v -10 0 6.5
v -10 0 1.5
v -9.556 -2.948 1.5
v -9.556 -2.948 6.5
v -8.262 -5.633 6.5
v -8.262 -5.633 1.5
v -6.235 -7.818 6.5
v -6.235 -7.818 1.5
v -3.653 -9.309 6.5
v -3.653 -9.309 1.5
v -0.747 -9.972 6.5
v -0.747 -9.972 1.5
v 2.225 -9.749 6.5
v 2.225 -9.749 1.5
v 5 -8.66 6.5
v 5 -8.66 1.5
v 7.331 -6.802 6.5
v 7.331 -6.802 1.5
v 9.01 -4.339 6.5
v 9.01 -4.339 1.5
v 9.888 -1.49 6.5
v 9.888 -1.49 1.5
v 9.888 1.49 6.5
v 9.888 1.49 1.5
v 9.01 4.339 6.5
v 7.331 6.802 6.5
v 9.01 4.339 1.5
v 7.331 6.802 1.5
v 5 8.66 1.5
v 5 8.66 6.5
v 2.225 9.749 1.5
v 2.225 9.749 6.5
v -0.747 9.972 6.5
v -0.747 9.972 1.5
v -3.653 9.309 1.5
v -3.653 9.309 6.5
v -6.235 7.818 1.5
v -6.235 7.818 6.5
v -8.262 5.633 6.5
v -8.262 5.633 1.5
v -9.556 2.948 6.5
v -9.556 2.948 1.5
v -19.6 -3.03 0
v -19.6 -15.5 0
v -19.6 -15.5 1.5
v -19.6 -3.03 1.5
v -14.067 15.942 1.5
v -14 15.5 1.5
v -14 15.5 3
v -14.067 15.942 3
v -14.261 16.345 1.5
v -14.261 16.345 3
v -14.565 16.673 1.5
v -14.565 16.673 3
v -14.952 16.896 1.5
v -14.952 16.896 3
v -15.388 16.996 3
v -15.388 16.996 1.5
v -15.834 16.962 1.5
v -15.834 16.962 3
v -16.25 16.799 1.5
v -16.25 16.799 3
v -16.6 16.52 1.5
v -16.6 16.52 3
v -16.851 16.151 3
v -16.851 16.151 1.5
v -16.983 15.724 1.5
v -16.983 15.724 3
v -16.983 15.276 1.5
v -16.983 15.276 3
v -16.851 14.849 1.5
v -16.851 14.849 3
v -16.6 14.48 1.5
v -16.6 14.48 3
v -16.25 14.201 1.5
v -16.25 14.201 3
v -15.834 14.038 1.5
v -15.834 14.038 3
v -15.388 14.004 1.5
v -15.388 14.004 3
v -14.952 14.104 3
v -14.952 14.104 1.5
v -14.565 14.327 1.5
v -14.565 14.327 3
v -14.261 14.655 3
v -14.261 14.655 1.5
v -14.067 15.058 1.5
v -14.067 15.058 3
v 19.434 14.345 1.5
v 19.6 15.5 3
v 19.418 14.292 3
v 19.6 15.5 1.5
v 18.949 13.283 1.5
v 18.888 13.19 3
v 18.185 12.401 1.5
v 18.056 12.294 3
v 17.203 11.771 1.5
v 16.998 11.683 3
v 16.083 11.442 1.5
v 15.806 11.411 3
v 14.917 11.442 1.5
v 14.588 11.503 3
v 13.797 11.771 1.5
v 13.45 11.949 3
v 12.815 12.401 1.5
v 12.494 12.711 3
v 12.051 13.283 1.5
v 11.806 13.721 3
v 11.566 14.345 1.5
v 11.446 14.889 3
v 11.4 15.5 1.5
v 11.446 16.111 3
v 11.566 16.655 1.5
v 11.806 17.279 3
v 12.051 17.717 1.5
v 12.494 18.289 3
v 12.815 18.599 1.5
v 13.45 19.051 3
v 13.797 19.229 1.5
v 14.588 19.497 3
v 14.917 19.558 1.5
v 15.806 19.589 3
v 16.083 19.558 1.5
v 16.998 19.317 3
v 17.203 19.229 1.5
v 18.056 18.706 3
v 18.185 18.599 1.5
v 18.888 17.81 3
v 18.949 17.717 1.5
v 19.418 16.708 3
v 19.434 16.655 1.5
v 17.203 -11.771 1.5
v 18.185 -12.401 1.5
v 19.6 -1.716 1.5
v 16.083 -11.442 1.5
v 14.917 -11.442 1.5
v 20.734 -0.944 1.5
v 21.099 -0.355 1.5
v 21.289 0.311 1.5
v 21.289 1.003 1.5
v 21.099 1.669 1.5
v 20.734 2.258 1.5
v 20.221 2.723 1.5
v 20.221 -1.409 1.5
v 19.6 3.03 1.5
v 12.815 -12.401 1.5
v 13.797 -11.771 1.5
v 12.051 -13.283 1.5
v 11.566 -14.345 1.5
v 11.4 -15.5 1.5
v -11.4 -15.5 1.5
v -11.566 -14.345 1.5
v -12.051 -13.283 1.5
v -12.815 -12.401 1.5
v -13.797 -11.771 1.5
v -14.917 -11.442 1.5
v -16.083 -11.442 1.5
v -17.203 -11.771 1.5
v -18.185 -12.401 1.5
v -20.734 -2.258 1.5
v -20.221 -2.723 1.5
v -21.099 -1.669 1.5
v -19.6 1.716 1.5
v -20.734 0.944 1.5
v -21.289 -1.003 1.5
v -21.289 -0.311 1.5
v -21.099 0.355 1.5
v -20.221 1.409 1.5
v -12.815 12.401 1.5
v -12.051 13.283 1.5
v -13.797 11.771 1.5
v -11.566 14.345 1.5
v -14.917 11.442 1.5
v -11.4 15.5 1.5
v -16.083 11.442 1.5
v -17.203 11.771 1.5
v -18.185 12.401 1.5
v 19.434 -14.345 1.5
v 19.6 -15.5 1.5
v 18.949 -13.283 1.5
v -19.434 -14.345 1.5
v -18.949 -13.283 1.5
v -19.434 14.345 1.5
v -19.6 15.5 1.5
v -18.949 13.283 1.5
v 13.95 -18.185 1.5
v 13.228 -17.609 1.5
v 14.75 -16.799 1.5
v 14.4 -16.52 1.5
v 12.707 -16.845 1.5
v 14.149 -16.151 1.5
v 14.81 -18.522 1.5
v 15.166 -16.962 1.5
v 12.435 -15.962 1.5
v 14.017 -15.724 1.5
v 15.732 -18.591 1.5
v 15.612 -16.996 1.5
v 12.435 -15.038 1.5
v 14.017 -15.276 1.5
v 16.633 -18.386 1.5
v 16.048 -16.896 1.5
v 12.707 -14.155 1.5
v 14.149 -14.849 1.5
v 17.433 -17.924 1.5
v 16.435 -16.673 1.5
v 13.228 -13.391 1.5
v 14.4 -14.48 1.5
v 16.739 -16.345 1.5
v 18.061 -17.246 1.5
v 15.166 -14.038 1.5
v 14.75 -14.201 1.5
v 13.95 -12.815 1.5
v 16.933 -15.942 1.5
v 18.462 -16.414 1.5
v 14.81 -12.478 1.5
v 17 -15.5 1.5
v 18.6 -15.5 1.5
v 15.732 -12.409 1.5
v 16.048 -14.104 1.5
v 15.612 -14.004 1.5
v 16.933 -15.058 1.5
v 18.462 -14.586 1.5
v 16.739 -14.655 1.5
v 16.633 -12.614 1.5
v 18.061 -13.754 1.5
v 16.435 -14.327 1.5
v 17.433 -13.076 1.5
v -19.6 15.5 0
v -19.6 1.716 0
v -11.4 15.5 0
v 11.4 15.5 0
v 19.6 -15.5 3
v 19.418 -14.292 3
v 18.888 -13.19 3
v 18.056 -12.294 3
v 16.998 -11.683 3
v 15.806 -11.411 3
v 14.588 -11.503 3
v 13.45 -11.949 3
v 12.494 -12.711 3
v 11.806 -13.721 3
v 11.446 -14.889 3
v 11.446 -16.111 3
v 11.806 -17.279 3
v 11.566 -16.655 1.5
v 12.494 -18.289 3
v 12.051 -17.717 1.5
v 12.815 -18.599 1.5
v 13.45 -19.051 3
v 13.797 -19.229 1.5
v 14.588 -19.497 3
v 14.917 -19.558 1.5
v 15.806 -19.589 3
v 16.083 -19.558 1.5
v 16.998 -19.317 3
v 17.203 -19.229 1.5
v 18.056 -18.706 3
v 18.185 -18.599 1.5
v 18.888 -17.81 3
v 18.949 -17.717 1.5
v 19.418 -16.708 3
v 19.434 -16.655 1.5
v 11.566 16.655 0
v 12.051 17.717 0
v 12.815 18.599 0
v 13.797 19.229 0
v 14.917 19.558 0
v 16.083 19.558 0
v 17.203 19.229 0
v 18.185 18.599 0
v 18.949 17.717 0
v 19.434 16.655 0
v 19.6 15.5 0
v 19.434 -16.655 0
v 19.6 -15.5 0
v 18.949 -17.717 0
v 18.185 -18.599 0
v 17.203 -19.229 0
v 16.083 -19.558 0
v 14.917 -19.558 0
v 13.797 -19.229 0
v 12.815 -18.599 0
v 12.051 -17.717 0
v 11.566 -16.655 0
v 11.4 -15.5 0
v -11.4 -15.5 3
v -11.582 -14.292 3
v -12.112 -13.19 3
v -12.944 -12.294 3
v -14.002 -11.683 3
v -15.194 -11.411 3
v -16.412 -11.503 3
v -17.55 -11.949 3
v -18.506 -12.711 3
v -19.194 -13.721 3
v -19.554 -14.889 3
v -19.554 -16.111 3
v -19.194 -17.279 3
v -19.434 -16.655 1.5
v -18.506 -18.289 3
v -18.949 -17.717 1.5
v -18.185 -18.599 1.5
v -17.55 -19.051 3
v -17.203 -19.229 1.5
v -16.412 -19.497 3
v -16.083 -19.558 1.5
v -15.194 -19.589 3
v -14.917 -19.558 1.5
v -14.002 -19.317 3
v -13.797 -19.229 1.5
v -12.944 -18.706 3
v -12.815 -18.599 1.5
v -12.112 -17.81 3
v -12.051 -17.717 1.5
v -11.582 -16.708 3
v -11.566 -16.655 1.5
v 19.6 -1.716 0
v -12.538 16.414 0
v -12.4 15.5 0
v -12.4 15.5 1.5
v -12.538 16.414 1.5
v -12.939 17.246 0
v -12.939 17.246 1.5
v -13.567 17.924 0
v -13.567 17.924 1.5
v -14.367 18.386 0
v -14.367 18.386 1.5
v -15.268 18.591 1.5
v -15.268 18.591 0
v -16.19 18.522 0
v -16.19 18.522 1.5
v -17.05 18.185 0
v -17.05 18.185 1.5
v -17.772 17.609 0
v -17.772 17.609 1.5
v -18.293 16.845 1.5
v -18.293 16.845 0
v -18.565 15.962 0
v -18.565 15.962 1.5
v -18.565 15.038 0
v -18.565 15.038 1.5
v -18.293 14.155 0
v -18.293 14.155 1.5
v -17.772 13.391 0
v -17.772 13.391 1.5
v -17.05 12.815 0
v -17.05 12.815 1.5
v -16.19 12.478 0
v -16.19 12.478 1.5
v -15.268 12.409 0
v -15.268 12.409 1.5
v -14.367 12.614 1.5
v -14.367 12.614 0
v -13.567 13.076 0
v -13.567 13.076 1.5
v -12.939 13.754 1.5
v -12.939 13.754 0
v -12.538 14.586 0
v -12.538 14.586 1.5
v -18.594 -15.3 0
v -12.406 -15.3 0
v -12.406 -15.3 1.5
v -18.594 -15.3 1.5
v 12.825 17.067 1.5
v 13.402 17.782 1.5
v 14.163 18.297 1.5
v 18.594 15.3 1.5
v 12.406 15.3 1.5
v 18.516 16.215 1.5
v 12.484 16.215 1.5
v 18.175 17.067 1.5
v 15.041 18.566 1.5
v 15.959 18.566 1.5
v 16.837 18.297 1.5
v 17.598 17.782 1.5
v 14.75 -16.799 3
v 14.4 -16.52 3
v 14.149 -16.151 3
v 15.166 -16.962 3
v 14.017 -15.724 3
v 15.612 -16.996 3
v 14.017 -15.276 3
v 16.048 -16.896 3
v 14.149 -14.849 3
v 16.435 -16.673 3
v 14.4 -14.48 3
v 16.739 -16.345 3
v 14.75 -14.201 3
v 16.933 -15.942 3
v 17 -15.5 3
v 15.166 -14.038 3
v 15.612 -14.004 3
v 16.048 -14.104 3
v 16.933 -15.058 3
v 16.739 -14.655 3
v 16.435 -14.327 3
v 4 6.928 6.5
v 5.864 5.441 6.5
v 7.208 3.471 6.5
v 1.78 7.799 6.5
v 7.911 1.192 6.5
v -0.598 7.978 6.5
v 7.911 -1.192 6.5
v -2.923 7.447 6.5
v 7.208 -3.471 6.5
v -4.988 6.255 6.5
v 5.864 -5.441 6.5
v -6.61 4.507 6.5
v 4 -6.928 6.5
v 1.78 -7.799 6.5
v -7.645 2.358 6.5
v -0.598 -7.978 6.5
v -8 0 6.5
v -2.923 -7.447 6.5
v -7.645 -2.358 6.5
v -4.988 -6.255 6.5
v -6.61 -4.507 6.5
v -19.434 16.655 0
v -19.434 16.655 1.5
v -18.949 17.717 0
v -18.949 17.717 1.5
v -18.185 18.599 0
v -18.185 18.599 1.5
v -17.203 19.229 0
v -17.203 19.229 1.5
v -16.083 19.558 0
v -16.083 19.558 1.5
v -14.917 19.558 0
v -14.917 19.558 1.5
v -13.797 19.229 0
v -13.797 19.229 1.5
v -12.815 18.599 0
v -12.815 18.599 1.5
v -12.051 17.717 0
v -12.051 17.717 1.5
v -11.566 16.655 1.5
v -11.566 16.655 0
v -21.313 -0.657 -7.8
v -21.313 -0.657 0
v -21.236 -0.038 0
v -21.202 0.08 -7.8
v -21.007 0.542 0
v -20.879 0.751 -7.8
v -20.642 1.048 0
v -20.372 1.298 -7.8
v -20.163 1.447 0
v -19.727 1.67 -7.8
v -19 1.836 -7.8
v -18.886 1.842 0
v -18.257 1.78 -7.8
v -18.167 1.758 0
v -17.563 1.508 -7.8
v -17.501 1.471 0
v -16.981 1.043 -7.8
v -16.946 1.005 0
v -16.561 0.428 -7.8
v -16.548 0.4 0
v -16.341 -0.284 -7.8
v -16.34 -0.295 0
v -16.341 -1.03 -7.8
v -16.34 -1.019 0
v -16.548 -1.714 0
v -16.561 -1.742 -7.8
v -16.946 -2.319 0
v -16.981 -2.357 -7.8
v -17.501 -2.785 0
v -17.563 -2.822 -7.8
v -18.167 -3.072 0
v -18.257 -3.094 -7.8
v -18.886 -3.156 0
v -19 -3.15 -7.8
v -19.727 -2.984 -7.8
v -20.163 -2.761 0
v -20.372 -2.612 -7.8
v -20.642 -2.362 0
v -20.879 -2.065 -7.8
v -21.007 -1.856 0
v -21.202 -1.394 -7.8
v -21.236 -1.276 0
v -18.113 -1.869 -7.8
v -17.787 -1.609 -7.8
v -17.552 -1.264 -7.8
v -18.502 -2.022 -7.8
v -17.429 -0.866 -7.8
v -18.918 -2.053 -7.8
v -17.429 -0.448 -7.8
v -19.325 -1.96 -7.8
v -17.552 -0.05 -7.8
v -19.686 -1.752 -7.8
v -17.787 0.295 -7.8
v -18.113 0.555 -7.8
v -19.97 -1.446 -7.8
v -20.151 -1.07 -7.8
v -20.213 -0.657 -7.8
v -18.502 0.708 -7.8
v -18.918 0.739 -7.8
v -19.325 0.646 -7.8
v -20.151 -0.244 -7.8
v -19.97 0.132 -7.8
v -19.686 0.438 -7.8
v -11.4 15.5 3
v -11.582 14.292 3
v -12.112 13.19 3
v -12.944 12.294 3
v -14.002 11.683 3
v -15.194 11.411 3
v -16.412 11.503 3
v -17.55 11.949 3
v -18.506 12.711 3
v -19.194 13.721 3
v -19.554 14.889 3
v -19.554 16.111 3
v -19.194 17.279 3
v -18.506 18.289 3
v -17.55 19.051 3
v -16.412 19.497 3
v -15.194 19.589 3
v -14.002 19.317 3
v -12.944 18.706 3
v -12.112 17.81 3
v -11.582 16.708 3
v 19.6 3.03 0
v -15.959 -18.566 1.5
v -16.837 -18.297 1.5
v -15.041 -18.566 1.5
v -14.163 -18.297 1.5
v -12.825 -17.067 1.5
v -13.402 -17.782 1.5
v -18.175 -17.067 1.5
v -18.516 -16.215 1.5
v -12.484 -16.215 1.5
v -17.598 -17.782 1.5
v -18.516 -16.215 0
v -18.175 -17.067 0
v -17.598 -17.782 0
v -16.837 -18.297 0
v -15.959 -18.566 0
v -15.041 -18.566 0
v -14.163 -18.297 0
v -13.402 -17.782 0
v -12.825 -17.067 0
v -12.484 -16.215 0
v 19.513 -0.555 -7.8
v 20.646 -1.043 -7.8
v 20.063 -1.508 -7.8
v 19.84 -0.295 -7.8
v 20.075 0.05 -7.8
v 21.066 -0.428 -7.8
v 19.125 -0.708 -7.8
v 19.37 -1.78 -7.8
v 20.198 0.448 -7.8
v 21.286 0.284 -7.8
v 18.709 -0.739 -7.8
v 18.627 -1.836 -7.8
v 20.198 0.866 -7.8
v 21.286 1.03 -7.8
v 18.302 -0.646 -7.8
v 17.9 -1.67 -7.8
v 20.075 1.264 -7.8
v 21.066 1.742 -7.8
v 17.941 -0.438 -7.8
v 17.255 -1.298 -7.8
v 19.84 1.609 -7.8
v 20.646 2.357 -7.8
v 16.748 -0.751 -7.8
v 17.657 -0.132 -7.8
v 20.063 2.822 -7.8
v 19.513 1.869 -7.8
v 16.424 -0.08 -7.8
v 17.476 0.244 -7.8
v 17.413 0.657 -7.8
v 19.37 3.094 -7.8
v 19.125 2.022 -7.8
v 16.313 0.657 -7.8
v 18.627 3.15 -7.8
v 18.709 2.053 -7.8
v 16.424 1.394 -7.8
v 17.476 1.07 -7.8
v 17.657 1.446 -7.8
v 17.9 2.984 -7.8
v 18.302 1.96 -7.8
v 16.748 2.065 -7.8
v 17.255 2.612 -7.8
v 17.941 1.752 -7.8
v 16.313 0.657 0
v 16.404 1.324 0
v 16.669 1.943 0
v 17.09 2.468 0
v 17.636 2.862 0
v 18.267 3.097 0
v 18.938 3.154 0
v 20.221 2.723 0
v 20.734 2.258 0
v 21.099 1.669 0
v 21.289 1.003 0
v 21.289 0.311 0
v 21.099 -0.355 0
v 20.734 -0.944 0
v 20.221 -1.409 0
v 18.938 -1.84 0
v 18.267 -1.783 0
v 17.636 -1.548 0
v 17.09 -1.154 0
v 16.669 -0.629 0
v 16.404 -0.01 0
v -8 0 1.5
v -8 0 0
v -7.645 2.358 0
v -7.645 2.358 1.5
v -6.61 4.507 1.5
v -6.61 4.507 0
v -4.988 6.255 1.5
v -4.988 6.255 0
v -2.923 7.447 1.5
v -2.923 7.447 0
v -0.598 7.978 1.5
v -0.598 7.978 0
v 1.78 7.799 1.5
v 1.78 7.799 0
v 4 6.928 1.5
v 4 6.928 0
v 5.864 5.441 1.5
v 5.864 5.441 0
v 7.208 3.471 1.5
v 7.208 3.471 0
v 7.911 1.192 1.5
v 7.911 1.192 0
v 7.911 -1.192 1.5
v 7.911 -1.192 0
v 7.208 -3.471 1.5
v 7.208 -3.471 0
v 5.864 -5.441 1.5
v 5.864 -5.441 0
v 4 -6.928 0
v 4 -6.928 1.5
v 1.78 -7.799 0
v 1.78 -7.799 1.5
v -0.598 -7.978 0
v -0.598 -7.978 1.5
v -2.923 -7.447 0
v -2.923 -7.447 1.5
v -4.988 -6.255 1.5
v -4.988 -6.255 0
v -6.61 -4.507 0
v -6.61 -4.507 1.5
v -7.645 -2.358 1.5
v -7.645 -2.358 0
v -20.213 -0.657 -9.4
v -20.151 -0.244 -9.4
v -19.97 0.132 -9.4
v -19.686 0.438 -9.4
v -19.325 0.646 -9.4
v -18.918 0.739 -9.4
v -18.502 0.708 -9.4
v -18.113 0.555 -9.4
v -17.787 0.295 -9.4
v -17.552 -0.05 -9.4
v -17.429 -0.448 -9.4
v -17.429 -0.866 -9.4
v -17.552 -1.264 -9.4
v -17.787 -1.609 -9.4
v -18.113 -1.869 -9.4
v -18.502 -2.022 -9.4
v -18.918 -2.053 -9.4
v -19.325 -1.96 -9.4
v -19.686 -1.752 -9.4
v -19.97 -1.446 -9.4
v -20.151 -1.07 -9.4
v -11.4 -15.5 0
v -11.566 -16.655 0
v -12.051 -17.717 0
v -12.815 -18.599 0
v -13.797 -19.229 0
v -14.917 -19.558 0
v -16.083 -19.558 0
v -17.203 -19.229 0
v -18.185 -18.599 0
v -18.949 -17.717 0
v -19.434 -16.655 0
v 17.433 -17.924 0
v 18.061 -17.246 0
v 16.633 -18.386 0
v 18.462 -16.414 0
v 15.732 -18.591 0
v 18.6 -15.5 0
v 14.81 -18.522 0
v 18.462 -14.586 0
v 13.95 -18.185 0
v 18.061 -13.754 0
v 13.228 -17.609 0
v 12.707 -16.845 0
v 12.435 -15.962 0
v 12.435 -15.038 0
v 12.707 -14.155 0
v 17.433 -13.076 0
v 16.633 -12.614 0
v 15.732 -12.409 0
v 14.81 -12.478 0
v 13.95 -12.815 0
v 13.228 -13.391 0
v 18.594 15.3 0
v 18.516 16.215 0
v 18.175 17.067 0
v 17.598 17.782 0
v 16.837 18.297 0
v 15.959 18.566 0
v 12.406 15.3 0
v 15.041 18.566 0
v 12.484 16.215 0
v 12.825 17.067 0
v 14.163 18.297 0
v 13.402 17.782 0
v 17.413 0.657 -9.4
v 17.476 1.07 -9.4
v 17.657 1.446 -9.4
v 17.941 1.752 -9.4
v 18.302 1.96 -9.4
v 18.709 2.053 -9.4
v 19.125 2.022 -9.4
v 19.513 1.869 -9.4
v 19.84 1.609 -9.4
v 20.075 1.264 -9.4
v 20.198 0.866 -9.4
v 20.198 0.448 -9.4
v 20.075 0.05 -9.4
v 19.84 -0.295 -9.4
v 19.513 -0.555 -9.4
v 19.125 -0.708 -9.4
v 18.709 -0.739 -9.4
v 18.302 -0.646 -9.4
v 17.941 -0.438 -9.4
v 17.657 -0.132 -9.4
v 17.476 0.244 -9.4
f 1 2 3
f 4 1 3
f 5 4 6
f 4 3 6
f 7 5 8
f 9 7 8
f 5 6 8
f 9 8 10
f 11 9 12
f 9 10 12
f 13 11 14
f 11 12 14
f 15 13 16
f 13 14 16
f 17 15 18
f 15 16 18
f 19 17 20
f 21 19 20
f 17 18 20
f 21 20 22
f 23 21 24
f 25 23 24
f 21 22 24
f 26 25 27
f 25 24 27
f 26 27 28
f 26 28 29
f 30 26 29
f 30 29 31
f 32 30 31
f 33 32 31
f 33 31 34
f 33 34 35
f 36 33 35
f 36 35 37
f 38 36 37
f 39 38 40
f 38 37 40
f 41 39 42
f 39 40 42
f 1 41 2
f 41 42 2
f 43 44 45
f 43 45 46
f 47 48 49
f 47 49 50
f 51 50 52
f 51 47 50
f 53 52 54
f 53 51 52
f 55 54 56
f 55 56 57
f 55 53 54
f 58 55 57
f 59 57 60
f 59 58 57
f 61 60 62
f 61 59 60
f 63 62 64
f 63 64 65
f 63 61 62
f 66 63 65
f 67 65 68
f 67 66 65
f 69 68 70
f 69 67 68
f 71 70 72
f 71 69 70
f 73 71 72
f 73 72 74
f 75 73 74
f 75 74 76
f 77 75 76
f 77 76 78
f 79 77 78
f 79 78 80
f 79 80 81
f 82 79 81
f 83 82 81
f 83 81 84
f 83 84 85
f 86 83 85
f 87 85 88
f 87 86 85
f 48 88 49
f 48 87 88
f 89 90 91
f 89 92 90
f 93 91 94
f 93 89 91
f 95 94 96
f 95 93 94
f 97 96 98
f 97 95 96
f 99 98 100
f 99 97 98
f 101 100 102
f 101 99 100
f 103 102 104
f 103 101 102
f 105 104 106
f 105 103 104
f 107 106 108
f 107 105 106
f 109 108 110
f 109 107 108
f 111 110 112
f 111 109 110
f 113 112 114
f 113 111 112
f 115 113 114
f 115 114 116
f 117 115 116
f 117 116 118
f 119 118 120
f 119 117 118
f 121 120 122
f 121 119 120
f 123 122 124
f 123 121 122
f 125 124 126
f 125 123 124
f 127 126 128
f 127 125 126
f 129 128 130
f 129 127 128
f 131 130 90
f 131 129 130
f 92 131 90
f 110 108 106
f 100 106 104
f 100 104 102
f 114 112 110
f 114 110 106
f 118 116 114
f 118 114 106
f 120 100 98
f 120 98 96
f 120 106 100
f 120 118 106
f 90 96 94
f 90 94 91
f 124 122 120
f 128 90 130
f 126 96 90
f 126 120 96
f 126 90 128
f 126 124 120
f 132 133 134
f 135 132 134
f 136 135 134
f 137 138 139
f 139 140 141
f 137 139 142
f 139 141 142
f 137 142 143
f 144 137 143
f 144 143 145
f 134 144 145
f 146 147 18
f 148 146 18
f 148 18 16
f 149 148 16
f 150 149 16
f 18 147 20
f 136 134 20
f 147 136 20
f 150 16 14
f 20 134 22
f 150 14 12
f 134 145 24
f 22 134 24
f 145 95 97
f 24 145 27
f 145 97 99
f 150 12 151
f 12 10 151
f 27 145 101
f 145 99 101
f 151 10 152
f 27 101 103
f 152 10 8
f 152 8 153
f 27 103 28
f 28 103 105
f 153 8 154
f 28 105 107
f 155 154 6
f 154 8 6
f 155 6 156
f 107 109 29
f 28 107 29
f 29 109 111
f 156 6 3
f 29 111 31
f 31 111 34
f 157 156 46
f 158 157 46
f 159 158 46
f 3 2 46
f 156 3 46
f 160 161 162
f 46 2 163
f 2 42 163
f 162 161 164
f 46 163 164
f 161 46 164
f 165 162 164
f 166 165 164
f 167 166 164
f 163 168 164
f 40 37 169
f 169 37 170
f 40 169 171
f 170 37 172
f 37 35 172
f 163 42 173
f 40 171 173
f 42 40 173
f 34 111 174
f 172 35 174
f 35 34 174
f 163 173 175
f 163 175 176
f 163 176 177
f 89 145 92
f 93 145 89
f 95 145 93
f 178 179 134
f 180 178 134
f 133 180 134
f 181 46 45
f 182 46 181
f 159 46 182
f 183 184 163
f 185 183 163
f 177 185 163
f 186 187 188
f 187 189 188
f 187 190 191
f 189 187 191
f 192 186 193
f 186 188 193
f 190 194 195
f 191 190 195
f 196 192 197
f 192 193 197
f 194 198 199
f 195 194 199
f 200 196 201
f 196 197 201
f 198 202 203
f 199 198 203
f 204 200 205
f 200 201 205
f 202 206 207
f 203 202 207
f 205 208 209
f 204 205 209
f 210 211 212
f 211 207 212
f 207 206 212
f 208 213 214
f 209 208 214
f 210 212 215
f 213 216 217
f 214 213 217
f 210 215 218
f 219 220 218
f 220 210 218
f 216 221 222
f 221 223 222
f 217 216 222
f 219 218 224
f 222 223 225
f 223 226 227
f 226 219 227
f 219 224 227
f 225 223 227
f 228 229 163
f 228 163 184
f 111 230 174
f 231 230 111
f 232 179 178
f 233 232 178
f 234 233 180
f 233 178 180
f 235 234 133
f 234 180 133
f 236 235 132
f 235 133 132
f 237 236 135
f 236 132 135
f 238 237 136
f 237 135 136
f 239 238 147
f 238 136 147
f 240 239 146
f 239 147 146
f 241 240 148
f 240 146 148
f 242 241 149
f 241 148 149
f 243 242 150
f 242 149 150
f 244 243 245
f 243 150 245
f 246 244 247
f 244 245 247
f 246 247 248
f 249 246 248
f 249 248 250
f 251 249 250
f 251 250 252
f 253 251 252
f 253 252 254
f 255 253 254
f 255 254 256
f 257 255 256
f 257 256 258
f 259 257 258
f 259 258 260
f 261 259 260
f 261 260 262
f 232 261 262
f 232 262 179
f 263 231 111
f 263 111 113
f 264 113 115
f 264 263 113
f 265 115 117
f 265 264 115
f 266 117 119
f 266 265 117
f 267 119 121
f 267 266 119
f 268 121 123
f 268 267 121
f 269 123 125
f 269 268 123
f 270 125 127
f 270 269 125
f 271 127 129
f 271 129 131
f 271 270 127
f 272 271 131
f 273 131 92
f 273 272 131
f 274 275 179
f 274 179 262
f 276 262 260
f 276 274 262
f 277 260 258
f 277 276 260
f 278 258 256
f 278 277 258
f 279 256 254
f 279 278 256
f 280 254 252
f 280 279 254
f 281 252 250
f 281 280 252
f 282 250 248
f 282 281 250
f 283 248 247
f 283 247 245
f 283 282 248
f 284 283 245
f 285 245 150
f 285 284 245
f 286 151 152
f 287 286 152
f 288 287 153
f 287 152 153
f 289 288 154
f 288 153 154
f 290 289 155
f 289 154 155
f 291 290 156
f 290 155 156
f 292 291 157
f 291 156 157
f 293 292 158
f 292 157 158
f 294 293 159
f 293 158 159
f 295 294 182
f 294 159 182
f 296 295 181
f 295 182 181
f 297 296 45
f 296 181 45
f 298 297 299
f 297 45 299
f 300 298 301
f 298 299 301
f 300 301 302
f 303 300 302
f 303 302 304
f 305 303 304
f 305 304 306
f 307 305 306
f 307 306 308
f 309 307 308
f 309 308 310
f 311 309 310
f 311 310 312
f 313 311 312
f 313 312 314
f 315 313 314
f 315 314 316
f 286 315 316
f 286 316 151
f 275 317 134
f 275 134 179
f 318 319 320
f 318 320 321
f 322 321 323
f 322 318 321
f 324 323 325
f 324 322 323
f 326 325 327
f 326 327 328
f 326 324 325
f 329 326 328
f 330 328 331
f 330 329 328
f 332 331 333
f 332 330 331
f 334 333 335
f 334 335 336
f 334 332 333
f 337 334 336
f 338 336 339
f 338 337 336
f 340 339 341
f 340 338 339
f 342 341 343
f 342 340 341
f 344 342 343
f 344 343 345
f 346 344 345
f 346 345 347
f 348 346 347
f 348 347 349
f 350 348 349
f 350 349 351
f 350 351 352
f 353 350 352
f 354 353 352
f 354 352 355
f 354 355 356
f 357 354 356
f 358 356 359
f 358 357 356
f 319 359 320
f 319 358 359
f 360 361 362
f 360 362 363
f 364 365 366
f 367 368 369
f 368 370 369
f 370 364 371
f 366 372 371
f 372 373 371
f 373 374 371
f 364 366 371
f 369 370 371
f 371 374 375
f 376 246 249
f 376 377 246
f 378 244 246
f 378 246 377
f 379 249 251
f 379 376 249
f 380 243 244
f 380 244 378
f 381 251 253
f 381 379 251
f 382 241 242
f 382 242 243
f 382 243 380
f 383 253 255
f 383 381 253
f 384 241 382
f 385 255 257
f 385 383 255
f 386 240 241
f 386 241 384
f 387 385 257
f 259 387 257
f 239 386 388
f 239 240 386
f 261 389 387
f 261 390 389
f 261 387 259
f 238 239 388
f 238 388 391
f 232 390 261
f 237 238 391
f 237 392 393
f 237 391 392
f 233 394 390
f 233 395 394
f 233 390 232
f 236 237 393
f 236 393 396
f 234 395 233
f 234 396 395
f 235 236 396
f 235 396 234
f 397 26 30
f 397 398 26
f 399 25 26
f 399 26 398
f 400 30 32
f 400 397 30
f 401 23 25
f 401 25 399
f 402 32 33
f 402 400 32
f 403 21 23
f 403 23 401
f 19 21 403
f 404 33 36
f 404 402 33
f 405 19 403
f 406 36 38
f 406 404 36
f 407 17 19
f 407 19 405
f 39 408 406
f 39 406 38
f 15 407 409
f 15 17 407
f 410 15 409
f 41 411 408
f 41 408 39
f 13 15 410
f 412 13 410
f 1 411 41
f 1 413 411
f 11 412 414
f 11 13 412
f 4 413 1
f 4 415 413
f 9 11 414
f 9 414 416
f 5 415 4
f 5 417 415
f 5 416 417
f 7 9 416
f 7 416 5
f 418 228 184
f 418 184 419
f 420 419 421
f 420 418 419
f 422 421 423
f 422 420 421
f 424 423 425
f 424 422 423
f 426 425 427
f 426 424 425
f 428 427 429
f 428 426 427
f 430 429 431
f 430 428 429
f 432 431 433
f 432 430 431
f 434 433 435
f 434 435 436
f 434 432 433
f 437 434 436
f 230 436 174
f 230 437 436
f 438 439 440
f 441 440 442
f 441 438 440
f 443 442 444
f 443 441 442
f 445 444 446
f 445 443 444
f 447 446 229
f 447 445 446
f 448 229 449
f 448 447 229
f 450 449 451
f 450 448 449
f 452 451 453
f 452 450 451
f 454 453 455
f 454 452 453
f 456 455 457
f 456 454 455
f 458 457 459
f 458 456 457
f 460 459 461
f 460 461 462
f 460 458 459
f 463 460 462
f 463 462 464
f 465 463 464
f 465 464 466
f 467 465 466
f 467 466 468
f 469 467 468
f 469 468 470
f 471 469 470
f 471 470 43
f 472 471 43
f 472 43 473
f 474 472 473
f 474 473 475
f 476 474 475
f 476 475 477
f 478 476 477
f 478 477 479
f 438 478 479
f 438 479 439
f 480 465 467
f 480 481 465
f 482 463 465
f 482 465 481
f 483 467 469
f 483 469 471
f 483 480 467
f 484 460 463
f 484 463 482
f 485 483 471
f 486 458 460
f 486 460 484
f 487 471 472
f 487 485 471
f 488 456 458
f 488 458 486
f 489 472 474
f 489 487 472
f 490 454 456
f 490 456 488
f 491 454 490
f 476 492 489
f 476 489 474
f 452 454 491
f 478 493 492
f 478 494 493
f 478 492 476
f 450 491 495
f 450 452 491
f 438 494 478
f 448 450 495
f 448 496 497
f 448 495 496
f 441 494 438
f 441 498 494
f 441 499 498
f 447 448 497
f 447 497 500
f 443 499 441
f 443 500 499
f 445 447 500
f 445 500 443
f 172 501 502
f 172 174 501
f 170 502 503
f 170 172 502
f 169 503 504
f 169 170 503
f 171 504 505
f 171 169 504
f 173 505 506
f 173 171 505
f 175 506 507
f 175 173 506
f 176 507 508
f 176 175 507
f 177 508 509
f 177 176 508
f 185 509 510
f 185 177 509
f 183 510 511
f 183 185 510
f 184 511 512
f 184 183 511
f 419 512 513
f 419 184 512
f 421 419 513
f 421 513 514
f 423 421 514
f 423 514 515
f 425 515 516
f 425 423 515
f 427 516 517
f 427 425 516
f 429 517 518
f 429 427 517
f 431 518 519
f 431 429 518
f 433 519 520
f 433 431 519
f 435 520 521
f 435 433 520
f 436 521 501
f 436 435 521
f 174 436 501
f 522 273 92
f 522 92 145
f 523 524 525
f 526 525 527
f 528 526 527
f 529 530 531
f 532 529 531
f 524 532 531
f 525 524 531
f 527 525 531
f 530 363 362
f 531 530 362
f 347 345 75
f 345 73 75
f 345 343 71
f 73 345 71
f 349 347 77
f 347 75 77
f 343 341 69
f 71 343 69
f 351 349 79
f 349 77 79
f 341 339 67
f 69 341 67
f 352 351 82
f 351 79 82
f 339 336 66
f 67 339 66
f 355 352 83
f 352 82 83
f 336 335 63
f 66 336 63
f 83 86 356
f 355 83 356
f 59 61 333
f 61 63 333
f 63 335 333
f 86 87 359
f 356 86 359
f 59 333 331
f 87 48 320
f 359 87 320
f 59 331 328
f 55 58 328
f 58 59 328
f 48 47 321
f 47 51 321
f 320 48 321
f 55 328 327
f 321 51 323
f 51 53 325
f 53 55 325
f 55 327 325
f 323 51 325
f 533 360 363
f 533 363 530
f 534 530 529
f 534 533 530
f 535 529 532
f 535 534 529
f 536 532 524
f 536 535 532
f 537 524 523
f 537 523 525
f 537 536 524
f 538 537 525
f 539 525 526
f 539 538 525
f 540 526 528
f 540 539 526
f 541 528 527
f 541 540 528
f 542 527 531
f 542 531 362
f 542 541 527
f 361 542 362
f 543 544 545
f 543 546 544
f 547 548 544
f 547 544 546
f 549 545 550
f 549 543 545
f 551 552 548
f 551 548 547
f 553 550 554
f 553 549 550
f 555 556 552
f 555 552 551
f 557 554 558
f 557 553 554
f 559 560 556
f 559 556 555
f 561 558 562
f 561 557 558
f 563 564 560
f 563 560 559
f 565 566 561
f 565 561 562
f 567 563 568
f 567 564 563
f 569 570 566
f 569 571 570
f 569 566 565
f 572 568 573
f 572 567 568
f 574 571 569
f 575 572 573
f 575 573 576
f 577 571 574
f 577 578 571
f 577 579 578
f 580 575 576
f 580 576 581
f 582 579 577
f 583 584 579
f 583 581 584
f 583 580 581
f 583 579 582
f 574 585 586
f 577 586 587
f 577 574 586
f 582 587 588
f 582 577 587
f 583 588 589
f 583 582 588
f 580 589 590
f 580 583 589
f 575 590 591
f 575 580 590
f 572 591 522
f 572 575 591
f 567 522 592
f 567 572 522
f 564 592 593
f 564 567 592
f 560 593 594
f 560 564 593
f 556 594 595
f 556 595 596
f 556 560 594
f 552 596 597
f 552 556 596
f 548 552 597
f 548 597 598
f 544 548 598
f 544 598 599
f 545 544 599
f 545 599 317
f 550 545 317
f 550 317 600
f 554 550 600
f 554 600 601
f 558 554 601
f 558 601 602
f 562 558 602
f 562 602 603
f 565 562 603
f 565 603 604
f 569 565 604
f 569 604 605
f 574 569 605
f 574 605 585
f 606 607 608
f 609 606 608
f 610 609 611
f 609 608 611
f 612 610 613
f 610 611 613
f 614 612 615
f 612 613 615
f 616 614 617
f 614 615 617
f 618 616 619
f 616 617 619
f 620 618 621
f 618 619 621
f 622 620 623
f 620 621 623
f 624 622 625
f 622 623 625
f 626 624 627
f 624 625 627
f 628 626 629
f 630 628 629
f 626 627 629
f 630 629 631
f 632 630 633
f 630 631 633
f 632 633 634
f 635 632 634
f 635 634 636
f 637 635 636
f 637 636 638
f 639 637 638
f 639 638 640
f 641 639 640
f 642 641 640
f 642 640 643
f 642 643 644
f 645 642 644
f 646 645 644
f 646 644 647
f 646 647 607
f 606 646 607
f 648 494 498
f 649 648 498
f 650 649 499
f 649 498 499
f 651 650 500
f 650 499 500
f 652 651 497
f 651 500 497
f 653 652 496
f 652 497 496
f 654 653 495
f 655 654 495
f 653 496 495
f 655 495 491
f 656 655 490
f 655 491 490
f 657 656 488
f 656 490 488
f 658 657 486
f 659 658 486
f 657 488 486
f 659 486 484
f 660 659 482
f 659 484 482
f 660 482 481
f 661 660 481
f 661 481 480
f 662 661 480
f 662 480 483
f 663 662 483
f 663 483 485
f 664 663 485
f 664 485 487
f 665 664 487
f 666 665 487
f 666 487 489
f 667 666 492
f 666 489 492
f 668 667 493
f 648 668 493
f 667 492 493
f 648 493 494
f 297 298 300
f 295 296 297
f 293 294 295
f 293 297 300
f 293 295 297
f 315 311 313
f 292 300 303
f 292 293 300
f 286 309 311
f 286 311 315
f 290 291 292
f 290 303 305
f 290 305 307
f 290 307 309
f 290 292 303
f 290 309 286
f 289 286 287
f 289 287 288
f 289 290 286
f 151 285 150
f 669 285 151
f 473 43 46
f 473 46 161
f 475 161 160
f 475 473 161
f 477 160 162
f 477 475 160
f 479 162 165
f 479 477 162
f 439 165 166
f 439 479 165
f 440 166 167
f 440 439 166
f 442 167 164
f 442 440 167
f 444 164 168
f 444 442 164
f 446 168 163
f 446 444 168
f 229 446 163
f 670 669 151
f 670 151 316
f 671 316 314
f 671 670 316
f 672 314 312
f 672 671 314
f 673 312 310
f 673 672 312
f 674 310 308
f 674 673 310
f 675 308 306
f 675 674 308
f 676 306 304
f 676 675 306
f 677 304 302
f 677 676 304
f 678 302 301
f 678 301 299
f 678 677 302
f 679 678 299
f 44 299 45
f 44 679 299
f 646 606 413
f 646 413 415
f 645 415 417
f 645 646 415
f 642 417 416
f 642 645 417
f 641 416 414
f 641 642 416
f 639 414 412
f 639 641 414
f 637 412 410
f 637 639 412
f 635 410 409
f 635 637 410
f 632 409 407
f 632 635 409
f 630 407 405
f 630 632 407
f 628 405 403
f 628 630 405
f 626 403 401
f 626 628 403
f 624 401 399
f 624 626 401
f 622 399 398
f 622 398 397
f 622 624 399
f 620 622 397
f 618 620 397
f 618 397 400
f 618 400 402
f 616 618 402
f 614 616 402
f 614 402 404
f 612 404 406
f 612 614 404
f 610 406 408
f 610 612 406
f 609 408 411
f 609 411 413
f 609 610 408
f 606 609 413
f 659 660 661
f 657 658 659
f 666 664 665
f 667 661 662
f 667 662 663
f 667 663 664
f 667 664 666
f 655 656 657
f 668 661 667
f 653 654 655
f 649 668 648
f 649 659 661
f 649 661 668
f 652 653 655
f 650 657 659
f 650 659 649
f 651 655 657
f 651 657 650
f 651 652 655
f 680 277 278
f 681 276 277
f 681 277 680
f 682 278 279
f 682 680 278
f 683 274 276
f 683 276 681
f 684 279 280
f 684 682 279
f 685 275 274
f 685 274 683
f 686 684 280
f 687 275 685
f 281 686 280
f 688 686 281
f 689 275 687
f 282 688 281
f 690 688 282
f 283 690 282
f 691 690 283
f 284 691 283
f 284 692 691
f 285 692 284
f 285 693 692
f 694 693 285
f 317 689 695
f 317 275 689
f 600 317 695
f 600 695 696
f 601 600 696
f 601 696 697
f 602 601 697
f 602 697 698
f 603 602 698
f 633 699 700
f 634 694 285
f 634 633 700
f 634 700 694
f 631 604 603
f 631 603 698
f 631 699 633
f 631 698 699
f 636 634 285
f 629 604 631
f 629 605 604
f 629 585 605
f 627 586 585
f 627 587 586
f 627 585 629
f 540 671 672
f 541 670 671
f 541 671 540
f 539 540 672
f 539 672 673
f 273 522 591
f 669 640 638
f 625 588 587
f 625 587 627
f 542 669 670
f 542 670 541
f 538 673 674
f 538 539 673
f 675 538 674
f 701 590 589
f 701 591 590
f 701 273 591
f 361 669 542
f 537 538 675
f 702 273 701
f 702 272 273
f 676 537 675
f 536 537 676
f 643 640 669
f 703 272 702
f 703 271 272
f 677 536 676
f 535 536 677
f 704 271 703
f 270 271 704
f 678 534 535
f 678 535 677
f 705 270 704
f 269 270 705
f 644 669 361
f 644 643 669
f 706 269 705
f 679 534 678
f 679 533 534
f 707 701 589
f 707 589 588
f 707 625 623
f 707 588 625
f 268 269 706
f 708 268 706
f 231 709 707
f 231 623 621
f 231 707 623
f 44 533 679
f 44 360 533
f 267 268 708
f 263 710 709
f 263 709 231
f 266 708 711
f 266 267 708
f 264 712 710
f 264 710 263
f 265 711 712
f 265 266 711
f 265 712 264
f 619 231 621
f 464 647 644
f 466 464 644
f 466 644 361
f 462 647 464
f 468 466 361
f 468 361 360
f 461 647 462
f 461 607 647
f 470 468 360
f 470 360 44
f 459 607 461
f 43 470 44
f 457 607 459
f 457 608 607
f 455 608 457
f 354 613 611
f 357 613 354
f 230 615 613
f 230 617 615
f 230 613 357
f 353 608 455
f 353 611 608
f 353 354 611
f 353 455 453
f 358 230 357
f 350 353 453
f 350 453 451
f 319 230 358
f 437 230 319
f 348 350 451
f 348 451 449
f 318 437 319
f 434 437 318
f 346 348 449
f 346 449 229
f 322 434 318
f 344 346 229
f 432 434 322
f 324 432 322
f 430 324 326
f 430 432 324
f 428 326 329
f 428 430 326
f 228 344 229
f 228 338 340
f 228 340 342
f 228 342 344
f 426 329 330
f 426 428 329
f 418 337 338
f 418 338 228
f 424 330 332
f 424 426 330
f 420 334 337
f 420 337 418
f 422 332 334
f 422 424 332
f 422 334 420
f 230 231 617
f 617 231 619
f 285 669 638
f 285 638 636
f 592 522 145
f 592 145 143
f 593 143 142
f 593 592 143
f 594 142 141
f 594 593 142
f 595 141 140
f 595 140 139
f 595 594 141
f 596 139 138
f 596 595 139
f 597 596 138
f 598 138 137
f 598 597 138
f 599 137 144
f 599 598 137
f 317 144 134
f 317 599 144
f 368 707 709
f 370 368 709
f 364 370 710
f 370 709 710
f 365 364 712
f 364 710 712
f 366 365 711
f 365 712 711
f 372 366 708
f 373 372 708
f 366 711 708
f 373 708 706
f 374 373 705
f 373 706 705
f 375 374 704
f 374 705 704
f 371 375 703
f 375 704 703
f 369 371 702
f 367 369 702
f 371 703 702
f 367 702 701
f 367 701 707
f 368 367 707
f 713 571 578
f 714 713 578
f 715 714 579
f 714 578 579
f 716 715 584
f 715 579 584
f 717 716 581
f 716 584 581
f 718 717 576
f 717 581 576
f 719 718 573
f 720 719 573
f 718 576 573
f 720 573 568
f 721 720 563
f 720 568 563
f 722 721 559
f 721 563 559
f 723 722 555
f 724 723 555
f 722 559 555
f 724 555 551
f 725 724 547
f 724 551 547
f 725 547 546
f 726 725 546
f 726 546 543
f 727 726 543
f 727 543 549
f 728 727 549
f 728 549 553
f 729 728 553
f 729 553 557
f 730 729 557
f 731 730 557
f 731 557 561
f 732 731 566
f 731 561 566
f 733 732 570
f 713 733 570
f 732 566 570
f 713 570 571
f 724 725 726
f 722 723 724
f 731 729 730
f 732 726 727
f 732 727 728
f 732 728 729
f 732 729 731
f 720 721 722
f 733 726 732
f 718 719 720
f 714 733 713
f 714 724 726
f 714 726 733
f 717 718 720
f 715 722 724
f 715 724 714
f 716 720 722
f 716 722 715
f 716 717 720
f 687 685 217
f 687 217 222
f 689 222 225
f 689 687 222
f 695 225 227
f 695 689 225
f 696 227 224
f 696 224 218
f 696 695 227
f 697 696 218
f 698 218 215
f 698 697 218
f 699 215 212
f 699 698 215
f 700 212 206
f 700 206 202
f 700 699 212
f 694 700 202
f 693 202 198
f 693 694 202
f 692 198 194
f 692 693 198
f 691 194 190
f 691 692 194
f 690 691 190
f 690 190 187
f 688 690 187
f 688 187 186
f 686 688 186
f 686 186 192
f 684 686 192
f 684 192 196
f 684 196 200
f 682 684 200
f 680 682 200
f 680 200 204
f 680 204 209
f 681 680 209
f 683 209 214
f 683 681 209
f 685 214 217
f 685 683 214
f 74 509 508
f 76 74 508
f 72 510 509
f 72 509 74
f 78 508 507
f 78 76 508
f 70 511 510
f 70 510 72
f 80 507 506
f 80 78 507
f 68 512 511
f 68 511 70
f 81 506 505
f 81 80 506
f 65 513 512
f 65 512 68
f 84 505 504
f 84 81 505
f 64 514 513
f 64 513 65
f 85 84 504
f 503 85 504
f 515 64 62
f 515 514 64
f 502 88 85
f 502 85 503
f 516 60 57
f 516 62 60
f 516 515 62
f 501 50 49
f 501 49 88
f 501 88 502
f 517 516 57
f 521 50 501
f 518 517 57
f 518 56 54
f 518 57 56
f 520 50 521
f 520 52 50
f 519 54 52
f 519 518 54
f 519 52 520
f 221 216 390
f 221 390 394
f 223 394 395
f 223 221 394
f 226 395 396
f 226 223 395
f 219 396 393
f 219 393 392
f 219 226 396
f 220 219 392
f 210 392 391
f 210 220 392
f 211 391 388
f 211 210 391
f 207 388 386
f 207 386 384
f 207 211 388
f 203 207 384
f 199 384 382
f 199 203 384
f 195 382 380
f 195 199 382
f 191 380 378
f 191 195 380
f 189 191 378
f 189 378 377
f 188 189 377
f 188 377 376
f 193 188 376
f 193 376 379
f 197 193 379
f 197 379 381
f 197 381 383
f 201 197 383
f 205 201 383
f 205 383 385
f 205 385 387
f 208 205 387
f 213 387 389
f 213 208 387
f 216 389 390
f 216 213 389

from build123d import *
from build123d.topology import SkipClean

# Parameters (mm, degrees)
SKETCH1_R      = 3.1
EXTRUDE1_DEPTH = 1.5
SKETCH2_R      = 4.1
SKETCH2_R_2    = 1.5
EXTRUDE2_DEPTH = 1.5
EXTRUDE3_START = 7.8
SKETCH3_R      = 2.5
EXTRUDE3_DEPTH = 7.8
SKETCH4_R      = 1.4
EXTRUDE4_DEPTH = 1.6
SKETCH5_R      = 8
EXTRUDE5_DEPTH = 31.443100442
SKETCH6_R      = 10
SKETCH6_R_2    = 8
EXTRUDE6_DEPTH = 5


with BuildPart() as part:
    # Sketch1 → Extrude1 (new body)
    with BuildSketch(Plane.XY):
        with BuildLine():
            Line((-11.4, 15.5), (11.4, 15.5))
            ThreePointArc((11.4, 15.5), (15.5, 19.6), (19.6, 15.5))
            Line((19.6, 15.5), (19.6, 3.03001766))
            ThreePointArc((19.6, 3.03001766), (21.313431552, 0.656979507), (19.6, -1.716058647))
            Line((19.6, -1.716058647), (19.6, -15.5))
            ThreePointArc((19.6, -15.5), (15.5, -19.6), (11.4, -15.5))
            Line((11.4, -15.5), (-11.4, -15.5))
            ThreePointArc((-11.4, -15.5), (-15.5, -19.6), (-19.6, -15.5))
            Line((-19.6, -15.5), (-19.6, -3.03001766))
            ThreePointArc((-19.6, -3.03001766), (-21.313431552, -0.656979507), (-19.6, 1.716058647))
            Line((-19.6, 1.716058647), (-19.6, 15.5))
            ThreePointArc((-19.6, 15.5), (-15.5, 19.6), (-11.4, 15.5))
        make_face()
        with Locations((15.5, -15.5)):
            Circle(SKETCH1_R, mode=Mode.SUBTRACT)
        with Locations((-15.5, 15.5)):
            Circle(SKETCH1_R, mode=Mode.SUBTRACT)
        with BuildLine():
            Line((-12.40645834, -15.3), (-18.59354166, -15.3))
            ThreePointArc((-18.59354166, -15.3), (-15.5, -18.6), (-12.40645834, -15.3))
        make_face(mode=Mode.SUBTRACT)
        with BuildLine():
            Line((18.59354166, 15.3), (12.40645834, 15.3))
            ThreePointArc((12.40645834, 15.3), (15.5, 18.6), (18.59354166, 15.3))
        make_face(mode=Mode.SUBTRACT)
    extrude(amount=EXTRUDE1_DEPTH)

    # Sketch2 → Extrude2 (add)
    # profile 1 of 4: a face of its own
    with SkipClean():  # the faces are left unmerged after this step: merging them gives an invalid solid
        with BuildSketch(Plane.XY.offset(1.5)):
            with Locations((-15.5, 15.5)):
                Circle(SKETCH2_R)
            with Locations((-15.5, 15.5)):
                Circle(SKETCH2_R_2, mode=Mode.SUBTRACT)
        # profile 2 of 4: a face of its own
        with BuildSketch(Plane.XY.offset(1.5)):
            with Locations((15.5, 15.5)):
                Circle(SKETCH2_R)
        # profile 3 of 4: a face of its own
        with BuildSketch(Plane.XY.offset(1.5)):
            with Locations((15.5, -15.5)):
                Circle(SKETCH2_R)
            with Locations((15.5, -15.5)):
                Circle(SKETCH2_R_2, mode=Mode.SUBTRACT)
        # profile 4 of 4: a face of its own
        with BuildSketch(Plane.XY.offset(1.5)):
            with Locations((-15.5, -15.5)):
                Circle(SKETCH2_R)
        extrude(amount=EXTRUDE2_DEPTH)
    add(part.part.scale(1), mode=Mode.REPLACE)  # the faces are merged on a copy

    # Sketch3 → Extrude3 (add)
    with BuildSketch(Plane(origin=(0, 0, 0), x_dir=(-1, 0, 0), z_dir=(0, 0, -1)).offset(EXTRUDE3_START)):
        with Locations((18.813431552, -0.656979507)):
            Circle(SKETCH3_R)
        with Locations((-18.813431552, 0.656979507)):
            Circle(SKETCH3_R)
    extrude(amount=-EXTRUDE3_DEPTH)

    # Sketch4 → Extrude4 (add)
    with BuildSketch(Plane(origin=(0, 0, -7.8), x_dir=(-1, 0, 0), z_dir=(0, 0, -1))):
        with Locations((-18.813431552, 0.656979507)):
            Circle(SKETCH4_R)
        with Locations((18.813431552, -0.656979507)):
            Circle(SKETCH4_R)
    extrude(amount=EXTRUDE4_DEPTH)

    # Sketch5 → Extrude5 (cut, through all)
    with BuildSketch(Plane(origin=(0, 0, 0), x_dir=(-1, 0, 0), z_dir=(0, 0, -1))):
        Circle(SKETCH5_R)
    extrude(amount=-EXTRUDE5_DEPTH, mode=Mode.SUBTRACT)

    # Sketch6 → Extrude6 (add)
    with SkipClean():  # the faces are left unmerged after this step: merging them gives an invalid solid
        with BuildSketch(Plane.XY.offset(1.5)):
            Circle(SKETCH6_R)
            Circle(SKETCH6_R_2, mode=Mode.SUBTRACT)
        extrude(amount=EXTRUDE6_DEPTH)


solid = part.part
